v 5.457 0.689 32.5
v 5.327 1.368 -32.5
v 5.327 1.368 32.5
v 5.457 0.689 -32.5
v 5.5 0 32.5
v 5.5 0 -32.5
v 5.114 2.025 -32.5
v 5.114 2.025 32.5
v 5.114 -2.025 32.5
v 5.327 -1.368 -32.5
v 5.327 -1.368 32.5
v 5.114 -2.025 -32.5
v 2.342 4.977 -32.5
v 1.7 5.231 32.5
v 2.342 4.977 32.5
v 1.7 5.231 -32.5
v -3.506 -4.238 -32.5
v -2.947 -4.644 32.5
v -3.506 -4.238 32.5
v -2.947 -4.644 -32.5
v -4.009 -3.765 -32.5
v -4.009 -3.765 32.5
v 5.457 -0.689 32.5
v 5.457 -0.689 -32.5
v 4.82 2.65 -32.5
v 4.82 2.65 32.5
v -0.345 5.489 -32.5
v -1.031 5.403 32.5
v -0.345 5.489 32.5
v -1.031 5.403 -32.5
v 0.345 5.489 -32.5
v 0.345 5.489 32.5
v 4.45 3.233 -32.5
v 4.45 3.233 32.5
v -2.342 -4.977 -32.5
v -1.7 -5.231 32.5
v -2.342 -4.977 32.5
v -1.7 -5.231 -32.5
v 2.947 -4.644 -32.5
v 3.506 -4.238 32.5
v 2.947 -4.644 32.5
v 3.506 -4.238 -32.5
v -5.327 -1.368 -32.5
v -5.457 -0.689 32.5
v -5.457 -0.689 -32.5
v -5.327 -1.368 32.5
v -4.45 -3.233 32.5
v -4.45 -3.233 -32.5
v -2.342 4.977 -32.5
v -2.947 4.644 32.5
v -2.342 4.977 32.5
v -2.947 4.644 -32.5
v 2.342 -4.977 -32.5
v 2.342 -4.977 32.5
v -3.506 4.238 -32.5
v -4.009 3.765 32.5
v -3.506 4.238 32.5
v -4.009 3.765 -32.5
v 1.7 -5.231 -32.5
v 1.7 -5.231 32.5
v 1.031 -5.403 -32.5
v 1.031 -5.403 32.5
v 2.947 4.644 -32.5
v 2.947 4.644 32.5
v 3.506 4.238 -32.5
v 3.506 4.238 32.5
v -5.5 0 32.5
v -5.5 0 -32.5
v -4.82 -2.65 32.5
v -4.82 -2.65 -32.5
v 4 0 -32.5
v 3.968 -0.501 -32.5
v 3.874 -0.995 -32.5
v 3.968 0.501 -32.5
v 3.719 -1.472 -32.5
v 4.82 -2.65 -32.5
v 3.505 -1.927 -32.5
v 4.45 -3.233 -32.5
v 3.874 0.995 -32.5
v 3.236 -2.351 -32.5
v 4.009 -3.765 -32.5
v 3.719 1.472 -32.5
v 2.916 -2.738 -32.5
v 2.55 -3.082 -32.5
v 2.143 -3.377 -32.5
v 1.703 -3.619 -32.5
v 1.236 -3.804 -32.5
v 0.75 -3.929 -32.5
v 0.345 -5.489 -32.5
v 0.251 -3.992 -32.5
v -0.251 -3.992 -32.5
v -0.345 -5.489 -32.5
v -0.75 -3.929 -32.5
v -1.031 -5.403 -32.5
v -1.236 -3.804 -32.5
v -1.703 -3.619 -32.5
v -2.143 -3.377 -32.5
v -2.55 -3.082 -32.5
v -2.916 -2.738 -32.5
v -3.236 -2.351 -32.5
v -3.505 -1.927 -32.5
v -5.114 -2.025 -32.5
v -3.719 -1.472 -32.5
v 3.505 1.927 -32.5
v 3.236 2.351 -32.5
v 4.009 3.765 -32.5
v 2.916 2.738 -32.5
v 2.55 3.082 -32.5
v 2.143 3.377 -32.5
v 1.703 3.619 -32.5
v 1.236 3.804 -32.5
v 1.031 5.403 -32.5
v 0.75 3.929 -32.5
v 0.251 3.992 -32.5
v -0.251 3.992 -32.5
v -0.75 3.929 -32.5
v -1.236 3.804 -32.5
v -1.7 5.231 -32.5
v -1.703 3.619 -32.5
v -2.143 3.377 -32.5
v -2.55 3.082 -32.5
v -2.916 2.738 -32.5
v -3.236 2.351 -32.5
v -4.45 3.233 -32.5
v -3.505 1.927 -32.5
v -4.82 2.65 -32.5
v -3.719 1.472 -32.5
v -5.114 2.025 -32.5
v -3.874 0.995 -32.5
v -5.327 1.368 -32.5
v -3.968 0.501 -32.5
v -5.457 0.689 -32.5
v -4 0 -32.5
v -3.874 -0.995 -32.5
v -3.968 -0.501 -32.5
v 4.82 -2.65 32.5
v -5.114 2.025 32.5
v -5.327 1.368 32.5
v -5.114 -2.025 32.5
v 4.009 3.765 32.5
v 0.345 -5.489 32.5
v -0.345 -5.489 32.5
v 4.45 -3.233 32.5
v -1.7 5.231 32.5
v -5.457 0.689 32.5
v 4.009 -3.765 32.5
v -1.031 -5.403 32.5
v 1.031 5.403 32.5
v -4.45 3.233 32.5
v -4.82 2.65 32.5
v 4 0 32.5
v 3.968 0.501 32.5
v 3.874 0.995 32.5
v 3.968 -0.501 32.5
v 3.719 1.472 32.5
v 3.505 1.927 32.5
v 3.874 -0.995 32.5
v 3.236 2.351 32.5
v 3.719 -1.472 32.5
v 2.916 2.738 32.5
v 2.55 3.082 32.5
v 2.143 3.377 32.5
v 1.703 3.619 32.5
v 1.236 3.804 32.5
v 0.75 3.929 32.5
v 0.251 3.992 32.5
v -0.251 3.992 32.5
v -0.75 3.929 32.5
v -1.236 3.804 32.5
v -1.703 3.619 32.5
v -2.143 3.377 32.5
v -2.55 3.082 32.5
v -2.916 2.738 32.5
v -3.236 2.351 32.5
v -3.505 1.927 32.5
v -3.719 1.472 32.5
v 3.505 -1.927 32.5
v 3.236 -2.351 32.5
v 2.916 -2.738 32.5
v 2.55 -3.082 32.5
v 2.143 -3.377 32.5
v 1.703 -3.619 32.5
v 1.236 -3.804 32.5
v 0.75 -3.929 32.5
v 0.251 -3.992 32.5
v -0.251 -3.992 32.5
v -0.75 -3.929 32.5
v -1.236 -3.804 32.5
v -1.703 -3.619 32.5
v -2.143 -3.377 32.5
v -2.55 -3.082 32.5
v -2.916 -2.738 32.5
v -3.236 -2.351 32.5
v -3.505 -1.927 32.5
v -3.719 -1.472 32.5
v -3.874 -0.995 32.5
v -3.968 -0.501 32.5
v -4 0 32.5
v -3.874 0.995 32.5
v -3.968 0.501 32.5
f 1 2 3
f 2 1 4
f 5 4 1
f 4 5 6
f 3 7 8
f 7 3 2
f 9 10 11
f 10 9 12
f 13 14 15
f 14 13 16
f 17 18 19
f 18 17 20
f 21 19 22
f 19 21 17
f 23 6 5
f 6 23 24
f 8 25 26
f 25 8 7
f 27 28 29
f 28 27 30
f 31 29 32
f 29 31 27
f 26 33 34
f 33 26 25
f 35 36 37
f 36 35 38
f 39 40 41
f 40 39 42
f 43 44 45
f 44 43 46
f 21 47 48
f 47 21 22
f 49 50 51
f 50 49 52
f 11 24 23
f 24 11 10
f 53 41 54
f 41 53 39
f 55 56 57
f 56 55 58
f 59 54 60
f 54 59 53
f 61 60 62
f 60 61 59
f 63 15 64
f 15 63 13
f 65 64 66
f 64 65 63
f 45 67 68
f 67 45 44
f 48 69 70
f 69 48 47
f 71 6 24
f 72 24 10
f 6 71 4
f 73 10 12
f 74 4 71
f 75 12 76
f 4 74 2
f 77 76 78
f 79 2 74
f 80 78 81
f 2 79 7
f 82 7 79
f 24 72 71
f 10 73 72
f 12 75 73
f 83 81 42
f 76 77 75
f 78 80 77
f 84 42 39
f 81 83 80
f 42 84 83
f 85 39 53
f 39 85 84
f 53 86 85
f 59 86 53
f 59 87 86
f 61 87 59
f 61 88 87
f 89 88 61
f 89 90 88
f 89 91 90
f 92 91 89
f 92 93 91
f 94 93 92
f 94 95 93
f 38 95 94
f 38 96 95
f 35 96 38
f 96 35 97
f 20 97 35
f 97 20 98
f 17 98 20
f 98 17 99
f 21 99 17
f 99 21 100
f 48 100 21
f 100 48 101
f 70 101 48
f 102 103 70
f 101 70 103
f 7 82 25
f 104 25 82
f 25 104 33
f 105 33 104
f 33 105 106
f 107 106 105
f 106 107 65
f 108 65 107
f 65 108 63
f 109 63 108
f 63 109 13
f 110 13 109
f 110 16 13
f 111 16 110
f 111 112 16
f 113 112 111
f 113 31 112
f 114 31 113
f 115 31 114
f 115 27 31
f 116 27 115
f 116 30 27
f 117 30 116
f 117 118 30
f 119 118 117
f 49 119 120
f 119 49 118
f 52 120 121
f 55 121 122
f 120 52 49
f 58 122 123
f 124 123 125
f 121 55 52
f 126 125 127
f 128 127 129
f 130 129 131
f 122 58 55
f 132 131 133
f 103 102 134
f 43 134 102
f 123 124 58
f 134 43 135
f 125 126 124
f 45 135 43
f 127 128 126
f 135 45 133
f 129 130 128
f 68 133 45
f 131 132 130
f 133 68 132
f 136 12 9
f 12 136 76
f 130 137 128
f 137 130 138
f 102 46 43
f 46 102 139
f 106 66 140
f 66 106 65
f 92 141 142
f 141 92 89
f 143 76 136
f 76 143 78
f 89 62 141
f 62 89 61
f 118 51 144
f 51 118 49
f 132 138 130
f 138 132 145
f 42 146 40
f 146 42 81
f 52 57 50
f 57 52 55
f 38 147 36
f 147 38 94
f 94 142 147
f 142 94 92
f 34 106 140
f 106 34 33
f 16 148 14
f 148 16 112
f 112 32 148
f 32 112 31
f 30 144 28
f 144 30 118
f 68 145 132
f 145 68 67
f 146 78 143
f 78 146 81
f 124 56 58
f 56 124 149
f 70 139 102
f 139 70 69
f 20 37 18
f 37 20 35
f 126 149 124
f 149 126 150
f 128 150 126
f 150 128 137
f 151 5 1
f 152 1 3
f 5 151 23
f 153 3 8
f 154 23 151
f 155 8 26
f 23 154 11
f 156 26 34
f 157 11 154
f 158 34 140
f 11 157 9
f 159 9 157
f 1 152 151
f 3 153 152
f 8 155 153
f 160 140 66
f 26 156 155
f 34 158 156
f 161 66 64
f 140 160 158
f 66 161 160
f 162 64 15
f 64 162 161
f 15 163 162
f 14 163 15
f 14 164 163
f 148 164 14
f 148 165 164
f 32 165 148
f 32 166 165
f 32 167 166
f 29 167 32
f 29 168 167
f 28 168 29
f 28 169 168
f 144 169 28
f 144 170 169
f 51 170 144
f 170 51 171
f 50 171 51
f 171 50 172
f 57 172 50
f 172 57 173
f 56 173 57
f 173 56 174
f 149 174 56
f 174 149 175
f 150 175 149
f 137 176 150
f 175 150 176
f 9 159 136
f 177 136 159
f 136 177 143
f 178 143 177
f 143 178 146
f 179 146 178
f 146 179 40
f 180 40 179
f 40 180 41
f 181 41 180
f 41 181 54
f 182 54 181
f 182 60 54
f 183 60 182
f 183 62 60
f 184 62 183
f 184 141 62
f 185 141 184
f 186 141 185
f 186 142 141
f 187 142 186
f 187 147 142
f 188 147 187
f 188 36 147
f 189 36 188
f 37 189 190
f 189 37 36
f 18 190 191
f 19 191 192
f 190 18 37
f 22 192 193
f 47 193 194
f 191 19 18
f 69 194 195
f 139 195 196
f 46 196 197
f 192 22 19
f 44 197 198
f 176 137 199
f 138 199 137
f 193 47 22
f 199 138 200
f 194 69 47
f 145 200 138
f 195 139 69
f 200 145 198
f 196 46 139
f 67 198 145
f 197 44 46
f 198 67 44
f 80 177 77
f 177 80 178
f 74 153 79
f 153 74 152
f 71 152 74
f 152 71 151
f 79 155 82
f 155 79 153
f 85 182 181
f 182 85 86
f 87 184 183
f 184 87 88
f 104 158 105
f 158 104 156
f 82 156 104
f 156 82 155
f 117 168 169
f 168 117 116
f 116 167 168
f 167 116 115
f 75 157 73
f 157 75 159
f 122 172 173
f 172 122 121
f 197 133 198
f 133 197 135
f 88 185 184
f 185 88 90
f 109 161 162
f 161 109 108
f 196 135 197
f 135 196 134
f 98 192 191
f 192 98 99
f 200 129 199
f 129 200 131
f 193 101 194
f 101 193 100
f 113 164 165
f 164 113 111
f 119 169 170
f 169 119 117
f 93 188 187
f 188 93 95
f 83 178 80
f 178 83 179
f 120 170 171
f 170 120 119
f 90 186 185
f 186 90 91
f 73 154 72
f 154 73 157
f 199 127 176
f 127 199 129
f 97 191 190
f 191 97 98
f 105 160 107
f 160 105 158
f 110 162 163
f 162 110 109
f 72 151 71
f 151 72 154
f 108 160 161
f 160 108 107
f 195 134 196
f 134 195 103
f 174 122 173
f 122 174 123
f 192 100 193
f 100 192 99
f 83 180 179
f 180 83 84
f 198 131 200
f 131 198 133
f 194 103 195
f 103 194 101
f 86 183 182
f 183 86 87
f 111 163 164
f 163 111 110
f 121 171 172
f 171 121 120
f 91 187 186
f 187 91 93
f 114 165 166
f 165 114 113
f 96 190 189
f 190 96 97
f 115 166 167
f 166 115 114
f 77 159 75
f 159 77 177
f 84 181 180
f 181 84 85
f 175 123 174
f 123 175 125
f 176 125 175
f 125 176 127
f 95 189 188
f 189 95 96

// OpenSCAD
$fn = 50;


difference() {
	union() {
		translate(v = [0, 0, -32.5000000000]) {
			cylinder(h = 65, r = 5.5000000000);
		}
	}
	union() {
		translate(v = [0, 0, -100.0000000000]) {
			cylinder(h = 200, r = 4.0000000000);
		}
	}
}
